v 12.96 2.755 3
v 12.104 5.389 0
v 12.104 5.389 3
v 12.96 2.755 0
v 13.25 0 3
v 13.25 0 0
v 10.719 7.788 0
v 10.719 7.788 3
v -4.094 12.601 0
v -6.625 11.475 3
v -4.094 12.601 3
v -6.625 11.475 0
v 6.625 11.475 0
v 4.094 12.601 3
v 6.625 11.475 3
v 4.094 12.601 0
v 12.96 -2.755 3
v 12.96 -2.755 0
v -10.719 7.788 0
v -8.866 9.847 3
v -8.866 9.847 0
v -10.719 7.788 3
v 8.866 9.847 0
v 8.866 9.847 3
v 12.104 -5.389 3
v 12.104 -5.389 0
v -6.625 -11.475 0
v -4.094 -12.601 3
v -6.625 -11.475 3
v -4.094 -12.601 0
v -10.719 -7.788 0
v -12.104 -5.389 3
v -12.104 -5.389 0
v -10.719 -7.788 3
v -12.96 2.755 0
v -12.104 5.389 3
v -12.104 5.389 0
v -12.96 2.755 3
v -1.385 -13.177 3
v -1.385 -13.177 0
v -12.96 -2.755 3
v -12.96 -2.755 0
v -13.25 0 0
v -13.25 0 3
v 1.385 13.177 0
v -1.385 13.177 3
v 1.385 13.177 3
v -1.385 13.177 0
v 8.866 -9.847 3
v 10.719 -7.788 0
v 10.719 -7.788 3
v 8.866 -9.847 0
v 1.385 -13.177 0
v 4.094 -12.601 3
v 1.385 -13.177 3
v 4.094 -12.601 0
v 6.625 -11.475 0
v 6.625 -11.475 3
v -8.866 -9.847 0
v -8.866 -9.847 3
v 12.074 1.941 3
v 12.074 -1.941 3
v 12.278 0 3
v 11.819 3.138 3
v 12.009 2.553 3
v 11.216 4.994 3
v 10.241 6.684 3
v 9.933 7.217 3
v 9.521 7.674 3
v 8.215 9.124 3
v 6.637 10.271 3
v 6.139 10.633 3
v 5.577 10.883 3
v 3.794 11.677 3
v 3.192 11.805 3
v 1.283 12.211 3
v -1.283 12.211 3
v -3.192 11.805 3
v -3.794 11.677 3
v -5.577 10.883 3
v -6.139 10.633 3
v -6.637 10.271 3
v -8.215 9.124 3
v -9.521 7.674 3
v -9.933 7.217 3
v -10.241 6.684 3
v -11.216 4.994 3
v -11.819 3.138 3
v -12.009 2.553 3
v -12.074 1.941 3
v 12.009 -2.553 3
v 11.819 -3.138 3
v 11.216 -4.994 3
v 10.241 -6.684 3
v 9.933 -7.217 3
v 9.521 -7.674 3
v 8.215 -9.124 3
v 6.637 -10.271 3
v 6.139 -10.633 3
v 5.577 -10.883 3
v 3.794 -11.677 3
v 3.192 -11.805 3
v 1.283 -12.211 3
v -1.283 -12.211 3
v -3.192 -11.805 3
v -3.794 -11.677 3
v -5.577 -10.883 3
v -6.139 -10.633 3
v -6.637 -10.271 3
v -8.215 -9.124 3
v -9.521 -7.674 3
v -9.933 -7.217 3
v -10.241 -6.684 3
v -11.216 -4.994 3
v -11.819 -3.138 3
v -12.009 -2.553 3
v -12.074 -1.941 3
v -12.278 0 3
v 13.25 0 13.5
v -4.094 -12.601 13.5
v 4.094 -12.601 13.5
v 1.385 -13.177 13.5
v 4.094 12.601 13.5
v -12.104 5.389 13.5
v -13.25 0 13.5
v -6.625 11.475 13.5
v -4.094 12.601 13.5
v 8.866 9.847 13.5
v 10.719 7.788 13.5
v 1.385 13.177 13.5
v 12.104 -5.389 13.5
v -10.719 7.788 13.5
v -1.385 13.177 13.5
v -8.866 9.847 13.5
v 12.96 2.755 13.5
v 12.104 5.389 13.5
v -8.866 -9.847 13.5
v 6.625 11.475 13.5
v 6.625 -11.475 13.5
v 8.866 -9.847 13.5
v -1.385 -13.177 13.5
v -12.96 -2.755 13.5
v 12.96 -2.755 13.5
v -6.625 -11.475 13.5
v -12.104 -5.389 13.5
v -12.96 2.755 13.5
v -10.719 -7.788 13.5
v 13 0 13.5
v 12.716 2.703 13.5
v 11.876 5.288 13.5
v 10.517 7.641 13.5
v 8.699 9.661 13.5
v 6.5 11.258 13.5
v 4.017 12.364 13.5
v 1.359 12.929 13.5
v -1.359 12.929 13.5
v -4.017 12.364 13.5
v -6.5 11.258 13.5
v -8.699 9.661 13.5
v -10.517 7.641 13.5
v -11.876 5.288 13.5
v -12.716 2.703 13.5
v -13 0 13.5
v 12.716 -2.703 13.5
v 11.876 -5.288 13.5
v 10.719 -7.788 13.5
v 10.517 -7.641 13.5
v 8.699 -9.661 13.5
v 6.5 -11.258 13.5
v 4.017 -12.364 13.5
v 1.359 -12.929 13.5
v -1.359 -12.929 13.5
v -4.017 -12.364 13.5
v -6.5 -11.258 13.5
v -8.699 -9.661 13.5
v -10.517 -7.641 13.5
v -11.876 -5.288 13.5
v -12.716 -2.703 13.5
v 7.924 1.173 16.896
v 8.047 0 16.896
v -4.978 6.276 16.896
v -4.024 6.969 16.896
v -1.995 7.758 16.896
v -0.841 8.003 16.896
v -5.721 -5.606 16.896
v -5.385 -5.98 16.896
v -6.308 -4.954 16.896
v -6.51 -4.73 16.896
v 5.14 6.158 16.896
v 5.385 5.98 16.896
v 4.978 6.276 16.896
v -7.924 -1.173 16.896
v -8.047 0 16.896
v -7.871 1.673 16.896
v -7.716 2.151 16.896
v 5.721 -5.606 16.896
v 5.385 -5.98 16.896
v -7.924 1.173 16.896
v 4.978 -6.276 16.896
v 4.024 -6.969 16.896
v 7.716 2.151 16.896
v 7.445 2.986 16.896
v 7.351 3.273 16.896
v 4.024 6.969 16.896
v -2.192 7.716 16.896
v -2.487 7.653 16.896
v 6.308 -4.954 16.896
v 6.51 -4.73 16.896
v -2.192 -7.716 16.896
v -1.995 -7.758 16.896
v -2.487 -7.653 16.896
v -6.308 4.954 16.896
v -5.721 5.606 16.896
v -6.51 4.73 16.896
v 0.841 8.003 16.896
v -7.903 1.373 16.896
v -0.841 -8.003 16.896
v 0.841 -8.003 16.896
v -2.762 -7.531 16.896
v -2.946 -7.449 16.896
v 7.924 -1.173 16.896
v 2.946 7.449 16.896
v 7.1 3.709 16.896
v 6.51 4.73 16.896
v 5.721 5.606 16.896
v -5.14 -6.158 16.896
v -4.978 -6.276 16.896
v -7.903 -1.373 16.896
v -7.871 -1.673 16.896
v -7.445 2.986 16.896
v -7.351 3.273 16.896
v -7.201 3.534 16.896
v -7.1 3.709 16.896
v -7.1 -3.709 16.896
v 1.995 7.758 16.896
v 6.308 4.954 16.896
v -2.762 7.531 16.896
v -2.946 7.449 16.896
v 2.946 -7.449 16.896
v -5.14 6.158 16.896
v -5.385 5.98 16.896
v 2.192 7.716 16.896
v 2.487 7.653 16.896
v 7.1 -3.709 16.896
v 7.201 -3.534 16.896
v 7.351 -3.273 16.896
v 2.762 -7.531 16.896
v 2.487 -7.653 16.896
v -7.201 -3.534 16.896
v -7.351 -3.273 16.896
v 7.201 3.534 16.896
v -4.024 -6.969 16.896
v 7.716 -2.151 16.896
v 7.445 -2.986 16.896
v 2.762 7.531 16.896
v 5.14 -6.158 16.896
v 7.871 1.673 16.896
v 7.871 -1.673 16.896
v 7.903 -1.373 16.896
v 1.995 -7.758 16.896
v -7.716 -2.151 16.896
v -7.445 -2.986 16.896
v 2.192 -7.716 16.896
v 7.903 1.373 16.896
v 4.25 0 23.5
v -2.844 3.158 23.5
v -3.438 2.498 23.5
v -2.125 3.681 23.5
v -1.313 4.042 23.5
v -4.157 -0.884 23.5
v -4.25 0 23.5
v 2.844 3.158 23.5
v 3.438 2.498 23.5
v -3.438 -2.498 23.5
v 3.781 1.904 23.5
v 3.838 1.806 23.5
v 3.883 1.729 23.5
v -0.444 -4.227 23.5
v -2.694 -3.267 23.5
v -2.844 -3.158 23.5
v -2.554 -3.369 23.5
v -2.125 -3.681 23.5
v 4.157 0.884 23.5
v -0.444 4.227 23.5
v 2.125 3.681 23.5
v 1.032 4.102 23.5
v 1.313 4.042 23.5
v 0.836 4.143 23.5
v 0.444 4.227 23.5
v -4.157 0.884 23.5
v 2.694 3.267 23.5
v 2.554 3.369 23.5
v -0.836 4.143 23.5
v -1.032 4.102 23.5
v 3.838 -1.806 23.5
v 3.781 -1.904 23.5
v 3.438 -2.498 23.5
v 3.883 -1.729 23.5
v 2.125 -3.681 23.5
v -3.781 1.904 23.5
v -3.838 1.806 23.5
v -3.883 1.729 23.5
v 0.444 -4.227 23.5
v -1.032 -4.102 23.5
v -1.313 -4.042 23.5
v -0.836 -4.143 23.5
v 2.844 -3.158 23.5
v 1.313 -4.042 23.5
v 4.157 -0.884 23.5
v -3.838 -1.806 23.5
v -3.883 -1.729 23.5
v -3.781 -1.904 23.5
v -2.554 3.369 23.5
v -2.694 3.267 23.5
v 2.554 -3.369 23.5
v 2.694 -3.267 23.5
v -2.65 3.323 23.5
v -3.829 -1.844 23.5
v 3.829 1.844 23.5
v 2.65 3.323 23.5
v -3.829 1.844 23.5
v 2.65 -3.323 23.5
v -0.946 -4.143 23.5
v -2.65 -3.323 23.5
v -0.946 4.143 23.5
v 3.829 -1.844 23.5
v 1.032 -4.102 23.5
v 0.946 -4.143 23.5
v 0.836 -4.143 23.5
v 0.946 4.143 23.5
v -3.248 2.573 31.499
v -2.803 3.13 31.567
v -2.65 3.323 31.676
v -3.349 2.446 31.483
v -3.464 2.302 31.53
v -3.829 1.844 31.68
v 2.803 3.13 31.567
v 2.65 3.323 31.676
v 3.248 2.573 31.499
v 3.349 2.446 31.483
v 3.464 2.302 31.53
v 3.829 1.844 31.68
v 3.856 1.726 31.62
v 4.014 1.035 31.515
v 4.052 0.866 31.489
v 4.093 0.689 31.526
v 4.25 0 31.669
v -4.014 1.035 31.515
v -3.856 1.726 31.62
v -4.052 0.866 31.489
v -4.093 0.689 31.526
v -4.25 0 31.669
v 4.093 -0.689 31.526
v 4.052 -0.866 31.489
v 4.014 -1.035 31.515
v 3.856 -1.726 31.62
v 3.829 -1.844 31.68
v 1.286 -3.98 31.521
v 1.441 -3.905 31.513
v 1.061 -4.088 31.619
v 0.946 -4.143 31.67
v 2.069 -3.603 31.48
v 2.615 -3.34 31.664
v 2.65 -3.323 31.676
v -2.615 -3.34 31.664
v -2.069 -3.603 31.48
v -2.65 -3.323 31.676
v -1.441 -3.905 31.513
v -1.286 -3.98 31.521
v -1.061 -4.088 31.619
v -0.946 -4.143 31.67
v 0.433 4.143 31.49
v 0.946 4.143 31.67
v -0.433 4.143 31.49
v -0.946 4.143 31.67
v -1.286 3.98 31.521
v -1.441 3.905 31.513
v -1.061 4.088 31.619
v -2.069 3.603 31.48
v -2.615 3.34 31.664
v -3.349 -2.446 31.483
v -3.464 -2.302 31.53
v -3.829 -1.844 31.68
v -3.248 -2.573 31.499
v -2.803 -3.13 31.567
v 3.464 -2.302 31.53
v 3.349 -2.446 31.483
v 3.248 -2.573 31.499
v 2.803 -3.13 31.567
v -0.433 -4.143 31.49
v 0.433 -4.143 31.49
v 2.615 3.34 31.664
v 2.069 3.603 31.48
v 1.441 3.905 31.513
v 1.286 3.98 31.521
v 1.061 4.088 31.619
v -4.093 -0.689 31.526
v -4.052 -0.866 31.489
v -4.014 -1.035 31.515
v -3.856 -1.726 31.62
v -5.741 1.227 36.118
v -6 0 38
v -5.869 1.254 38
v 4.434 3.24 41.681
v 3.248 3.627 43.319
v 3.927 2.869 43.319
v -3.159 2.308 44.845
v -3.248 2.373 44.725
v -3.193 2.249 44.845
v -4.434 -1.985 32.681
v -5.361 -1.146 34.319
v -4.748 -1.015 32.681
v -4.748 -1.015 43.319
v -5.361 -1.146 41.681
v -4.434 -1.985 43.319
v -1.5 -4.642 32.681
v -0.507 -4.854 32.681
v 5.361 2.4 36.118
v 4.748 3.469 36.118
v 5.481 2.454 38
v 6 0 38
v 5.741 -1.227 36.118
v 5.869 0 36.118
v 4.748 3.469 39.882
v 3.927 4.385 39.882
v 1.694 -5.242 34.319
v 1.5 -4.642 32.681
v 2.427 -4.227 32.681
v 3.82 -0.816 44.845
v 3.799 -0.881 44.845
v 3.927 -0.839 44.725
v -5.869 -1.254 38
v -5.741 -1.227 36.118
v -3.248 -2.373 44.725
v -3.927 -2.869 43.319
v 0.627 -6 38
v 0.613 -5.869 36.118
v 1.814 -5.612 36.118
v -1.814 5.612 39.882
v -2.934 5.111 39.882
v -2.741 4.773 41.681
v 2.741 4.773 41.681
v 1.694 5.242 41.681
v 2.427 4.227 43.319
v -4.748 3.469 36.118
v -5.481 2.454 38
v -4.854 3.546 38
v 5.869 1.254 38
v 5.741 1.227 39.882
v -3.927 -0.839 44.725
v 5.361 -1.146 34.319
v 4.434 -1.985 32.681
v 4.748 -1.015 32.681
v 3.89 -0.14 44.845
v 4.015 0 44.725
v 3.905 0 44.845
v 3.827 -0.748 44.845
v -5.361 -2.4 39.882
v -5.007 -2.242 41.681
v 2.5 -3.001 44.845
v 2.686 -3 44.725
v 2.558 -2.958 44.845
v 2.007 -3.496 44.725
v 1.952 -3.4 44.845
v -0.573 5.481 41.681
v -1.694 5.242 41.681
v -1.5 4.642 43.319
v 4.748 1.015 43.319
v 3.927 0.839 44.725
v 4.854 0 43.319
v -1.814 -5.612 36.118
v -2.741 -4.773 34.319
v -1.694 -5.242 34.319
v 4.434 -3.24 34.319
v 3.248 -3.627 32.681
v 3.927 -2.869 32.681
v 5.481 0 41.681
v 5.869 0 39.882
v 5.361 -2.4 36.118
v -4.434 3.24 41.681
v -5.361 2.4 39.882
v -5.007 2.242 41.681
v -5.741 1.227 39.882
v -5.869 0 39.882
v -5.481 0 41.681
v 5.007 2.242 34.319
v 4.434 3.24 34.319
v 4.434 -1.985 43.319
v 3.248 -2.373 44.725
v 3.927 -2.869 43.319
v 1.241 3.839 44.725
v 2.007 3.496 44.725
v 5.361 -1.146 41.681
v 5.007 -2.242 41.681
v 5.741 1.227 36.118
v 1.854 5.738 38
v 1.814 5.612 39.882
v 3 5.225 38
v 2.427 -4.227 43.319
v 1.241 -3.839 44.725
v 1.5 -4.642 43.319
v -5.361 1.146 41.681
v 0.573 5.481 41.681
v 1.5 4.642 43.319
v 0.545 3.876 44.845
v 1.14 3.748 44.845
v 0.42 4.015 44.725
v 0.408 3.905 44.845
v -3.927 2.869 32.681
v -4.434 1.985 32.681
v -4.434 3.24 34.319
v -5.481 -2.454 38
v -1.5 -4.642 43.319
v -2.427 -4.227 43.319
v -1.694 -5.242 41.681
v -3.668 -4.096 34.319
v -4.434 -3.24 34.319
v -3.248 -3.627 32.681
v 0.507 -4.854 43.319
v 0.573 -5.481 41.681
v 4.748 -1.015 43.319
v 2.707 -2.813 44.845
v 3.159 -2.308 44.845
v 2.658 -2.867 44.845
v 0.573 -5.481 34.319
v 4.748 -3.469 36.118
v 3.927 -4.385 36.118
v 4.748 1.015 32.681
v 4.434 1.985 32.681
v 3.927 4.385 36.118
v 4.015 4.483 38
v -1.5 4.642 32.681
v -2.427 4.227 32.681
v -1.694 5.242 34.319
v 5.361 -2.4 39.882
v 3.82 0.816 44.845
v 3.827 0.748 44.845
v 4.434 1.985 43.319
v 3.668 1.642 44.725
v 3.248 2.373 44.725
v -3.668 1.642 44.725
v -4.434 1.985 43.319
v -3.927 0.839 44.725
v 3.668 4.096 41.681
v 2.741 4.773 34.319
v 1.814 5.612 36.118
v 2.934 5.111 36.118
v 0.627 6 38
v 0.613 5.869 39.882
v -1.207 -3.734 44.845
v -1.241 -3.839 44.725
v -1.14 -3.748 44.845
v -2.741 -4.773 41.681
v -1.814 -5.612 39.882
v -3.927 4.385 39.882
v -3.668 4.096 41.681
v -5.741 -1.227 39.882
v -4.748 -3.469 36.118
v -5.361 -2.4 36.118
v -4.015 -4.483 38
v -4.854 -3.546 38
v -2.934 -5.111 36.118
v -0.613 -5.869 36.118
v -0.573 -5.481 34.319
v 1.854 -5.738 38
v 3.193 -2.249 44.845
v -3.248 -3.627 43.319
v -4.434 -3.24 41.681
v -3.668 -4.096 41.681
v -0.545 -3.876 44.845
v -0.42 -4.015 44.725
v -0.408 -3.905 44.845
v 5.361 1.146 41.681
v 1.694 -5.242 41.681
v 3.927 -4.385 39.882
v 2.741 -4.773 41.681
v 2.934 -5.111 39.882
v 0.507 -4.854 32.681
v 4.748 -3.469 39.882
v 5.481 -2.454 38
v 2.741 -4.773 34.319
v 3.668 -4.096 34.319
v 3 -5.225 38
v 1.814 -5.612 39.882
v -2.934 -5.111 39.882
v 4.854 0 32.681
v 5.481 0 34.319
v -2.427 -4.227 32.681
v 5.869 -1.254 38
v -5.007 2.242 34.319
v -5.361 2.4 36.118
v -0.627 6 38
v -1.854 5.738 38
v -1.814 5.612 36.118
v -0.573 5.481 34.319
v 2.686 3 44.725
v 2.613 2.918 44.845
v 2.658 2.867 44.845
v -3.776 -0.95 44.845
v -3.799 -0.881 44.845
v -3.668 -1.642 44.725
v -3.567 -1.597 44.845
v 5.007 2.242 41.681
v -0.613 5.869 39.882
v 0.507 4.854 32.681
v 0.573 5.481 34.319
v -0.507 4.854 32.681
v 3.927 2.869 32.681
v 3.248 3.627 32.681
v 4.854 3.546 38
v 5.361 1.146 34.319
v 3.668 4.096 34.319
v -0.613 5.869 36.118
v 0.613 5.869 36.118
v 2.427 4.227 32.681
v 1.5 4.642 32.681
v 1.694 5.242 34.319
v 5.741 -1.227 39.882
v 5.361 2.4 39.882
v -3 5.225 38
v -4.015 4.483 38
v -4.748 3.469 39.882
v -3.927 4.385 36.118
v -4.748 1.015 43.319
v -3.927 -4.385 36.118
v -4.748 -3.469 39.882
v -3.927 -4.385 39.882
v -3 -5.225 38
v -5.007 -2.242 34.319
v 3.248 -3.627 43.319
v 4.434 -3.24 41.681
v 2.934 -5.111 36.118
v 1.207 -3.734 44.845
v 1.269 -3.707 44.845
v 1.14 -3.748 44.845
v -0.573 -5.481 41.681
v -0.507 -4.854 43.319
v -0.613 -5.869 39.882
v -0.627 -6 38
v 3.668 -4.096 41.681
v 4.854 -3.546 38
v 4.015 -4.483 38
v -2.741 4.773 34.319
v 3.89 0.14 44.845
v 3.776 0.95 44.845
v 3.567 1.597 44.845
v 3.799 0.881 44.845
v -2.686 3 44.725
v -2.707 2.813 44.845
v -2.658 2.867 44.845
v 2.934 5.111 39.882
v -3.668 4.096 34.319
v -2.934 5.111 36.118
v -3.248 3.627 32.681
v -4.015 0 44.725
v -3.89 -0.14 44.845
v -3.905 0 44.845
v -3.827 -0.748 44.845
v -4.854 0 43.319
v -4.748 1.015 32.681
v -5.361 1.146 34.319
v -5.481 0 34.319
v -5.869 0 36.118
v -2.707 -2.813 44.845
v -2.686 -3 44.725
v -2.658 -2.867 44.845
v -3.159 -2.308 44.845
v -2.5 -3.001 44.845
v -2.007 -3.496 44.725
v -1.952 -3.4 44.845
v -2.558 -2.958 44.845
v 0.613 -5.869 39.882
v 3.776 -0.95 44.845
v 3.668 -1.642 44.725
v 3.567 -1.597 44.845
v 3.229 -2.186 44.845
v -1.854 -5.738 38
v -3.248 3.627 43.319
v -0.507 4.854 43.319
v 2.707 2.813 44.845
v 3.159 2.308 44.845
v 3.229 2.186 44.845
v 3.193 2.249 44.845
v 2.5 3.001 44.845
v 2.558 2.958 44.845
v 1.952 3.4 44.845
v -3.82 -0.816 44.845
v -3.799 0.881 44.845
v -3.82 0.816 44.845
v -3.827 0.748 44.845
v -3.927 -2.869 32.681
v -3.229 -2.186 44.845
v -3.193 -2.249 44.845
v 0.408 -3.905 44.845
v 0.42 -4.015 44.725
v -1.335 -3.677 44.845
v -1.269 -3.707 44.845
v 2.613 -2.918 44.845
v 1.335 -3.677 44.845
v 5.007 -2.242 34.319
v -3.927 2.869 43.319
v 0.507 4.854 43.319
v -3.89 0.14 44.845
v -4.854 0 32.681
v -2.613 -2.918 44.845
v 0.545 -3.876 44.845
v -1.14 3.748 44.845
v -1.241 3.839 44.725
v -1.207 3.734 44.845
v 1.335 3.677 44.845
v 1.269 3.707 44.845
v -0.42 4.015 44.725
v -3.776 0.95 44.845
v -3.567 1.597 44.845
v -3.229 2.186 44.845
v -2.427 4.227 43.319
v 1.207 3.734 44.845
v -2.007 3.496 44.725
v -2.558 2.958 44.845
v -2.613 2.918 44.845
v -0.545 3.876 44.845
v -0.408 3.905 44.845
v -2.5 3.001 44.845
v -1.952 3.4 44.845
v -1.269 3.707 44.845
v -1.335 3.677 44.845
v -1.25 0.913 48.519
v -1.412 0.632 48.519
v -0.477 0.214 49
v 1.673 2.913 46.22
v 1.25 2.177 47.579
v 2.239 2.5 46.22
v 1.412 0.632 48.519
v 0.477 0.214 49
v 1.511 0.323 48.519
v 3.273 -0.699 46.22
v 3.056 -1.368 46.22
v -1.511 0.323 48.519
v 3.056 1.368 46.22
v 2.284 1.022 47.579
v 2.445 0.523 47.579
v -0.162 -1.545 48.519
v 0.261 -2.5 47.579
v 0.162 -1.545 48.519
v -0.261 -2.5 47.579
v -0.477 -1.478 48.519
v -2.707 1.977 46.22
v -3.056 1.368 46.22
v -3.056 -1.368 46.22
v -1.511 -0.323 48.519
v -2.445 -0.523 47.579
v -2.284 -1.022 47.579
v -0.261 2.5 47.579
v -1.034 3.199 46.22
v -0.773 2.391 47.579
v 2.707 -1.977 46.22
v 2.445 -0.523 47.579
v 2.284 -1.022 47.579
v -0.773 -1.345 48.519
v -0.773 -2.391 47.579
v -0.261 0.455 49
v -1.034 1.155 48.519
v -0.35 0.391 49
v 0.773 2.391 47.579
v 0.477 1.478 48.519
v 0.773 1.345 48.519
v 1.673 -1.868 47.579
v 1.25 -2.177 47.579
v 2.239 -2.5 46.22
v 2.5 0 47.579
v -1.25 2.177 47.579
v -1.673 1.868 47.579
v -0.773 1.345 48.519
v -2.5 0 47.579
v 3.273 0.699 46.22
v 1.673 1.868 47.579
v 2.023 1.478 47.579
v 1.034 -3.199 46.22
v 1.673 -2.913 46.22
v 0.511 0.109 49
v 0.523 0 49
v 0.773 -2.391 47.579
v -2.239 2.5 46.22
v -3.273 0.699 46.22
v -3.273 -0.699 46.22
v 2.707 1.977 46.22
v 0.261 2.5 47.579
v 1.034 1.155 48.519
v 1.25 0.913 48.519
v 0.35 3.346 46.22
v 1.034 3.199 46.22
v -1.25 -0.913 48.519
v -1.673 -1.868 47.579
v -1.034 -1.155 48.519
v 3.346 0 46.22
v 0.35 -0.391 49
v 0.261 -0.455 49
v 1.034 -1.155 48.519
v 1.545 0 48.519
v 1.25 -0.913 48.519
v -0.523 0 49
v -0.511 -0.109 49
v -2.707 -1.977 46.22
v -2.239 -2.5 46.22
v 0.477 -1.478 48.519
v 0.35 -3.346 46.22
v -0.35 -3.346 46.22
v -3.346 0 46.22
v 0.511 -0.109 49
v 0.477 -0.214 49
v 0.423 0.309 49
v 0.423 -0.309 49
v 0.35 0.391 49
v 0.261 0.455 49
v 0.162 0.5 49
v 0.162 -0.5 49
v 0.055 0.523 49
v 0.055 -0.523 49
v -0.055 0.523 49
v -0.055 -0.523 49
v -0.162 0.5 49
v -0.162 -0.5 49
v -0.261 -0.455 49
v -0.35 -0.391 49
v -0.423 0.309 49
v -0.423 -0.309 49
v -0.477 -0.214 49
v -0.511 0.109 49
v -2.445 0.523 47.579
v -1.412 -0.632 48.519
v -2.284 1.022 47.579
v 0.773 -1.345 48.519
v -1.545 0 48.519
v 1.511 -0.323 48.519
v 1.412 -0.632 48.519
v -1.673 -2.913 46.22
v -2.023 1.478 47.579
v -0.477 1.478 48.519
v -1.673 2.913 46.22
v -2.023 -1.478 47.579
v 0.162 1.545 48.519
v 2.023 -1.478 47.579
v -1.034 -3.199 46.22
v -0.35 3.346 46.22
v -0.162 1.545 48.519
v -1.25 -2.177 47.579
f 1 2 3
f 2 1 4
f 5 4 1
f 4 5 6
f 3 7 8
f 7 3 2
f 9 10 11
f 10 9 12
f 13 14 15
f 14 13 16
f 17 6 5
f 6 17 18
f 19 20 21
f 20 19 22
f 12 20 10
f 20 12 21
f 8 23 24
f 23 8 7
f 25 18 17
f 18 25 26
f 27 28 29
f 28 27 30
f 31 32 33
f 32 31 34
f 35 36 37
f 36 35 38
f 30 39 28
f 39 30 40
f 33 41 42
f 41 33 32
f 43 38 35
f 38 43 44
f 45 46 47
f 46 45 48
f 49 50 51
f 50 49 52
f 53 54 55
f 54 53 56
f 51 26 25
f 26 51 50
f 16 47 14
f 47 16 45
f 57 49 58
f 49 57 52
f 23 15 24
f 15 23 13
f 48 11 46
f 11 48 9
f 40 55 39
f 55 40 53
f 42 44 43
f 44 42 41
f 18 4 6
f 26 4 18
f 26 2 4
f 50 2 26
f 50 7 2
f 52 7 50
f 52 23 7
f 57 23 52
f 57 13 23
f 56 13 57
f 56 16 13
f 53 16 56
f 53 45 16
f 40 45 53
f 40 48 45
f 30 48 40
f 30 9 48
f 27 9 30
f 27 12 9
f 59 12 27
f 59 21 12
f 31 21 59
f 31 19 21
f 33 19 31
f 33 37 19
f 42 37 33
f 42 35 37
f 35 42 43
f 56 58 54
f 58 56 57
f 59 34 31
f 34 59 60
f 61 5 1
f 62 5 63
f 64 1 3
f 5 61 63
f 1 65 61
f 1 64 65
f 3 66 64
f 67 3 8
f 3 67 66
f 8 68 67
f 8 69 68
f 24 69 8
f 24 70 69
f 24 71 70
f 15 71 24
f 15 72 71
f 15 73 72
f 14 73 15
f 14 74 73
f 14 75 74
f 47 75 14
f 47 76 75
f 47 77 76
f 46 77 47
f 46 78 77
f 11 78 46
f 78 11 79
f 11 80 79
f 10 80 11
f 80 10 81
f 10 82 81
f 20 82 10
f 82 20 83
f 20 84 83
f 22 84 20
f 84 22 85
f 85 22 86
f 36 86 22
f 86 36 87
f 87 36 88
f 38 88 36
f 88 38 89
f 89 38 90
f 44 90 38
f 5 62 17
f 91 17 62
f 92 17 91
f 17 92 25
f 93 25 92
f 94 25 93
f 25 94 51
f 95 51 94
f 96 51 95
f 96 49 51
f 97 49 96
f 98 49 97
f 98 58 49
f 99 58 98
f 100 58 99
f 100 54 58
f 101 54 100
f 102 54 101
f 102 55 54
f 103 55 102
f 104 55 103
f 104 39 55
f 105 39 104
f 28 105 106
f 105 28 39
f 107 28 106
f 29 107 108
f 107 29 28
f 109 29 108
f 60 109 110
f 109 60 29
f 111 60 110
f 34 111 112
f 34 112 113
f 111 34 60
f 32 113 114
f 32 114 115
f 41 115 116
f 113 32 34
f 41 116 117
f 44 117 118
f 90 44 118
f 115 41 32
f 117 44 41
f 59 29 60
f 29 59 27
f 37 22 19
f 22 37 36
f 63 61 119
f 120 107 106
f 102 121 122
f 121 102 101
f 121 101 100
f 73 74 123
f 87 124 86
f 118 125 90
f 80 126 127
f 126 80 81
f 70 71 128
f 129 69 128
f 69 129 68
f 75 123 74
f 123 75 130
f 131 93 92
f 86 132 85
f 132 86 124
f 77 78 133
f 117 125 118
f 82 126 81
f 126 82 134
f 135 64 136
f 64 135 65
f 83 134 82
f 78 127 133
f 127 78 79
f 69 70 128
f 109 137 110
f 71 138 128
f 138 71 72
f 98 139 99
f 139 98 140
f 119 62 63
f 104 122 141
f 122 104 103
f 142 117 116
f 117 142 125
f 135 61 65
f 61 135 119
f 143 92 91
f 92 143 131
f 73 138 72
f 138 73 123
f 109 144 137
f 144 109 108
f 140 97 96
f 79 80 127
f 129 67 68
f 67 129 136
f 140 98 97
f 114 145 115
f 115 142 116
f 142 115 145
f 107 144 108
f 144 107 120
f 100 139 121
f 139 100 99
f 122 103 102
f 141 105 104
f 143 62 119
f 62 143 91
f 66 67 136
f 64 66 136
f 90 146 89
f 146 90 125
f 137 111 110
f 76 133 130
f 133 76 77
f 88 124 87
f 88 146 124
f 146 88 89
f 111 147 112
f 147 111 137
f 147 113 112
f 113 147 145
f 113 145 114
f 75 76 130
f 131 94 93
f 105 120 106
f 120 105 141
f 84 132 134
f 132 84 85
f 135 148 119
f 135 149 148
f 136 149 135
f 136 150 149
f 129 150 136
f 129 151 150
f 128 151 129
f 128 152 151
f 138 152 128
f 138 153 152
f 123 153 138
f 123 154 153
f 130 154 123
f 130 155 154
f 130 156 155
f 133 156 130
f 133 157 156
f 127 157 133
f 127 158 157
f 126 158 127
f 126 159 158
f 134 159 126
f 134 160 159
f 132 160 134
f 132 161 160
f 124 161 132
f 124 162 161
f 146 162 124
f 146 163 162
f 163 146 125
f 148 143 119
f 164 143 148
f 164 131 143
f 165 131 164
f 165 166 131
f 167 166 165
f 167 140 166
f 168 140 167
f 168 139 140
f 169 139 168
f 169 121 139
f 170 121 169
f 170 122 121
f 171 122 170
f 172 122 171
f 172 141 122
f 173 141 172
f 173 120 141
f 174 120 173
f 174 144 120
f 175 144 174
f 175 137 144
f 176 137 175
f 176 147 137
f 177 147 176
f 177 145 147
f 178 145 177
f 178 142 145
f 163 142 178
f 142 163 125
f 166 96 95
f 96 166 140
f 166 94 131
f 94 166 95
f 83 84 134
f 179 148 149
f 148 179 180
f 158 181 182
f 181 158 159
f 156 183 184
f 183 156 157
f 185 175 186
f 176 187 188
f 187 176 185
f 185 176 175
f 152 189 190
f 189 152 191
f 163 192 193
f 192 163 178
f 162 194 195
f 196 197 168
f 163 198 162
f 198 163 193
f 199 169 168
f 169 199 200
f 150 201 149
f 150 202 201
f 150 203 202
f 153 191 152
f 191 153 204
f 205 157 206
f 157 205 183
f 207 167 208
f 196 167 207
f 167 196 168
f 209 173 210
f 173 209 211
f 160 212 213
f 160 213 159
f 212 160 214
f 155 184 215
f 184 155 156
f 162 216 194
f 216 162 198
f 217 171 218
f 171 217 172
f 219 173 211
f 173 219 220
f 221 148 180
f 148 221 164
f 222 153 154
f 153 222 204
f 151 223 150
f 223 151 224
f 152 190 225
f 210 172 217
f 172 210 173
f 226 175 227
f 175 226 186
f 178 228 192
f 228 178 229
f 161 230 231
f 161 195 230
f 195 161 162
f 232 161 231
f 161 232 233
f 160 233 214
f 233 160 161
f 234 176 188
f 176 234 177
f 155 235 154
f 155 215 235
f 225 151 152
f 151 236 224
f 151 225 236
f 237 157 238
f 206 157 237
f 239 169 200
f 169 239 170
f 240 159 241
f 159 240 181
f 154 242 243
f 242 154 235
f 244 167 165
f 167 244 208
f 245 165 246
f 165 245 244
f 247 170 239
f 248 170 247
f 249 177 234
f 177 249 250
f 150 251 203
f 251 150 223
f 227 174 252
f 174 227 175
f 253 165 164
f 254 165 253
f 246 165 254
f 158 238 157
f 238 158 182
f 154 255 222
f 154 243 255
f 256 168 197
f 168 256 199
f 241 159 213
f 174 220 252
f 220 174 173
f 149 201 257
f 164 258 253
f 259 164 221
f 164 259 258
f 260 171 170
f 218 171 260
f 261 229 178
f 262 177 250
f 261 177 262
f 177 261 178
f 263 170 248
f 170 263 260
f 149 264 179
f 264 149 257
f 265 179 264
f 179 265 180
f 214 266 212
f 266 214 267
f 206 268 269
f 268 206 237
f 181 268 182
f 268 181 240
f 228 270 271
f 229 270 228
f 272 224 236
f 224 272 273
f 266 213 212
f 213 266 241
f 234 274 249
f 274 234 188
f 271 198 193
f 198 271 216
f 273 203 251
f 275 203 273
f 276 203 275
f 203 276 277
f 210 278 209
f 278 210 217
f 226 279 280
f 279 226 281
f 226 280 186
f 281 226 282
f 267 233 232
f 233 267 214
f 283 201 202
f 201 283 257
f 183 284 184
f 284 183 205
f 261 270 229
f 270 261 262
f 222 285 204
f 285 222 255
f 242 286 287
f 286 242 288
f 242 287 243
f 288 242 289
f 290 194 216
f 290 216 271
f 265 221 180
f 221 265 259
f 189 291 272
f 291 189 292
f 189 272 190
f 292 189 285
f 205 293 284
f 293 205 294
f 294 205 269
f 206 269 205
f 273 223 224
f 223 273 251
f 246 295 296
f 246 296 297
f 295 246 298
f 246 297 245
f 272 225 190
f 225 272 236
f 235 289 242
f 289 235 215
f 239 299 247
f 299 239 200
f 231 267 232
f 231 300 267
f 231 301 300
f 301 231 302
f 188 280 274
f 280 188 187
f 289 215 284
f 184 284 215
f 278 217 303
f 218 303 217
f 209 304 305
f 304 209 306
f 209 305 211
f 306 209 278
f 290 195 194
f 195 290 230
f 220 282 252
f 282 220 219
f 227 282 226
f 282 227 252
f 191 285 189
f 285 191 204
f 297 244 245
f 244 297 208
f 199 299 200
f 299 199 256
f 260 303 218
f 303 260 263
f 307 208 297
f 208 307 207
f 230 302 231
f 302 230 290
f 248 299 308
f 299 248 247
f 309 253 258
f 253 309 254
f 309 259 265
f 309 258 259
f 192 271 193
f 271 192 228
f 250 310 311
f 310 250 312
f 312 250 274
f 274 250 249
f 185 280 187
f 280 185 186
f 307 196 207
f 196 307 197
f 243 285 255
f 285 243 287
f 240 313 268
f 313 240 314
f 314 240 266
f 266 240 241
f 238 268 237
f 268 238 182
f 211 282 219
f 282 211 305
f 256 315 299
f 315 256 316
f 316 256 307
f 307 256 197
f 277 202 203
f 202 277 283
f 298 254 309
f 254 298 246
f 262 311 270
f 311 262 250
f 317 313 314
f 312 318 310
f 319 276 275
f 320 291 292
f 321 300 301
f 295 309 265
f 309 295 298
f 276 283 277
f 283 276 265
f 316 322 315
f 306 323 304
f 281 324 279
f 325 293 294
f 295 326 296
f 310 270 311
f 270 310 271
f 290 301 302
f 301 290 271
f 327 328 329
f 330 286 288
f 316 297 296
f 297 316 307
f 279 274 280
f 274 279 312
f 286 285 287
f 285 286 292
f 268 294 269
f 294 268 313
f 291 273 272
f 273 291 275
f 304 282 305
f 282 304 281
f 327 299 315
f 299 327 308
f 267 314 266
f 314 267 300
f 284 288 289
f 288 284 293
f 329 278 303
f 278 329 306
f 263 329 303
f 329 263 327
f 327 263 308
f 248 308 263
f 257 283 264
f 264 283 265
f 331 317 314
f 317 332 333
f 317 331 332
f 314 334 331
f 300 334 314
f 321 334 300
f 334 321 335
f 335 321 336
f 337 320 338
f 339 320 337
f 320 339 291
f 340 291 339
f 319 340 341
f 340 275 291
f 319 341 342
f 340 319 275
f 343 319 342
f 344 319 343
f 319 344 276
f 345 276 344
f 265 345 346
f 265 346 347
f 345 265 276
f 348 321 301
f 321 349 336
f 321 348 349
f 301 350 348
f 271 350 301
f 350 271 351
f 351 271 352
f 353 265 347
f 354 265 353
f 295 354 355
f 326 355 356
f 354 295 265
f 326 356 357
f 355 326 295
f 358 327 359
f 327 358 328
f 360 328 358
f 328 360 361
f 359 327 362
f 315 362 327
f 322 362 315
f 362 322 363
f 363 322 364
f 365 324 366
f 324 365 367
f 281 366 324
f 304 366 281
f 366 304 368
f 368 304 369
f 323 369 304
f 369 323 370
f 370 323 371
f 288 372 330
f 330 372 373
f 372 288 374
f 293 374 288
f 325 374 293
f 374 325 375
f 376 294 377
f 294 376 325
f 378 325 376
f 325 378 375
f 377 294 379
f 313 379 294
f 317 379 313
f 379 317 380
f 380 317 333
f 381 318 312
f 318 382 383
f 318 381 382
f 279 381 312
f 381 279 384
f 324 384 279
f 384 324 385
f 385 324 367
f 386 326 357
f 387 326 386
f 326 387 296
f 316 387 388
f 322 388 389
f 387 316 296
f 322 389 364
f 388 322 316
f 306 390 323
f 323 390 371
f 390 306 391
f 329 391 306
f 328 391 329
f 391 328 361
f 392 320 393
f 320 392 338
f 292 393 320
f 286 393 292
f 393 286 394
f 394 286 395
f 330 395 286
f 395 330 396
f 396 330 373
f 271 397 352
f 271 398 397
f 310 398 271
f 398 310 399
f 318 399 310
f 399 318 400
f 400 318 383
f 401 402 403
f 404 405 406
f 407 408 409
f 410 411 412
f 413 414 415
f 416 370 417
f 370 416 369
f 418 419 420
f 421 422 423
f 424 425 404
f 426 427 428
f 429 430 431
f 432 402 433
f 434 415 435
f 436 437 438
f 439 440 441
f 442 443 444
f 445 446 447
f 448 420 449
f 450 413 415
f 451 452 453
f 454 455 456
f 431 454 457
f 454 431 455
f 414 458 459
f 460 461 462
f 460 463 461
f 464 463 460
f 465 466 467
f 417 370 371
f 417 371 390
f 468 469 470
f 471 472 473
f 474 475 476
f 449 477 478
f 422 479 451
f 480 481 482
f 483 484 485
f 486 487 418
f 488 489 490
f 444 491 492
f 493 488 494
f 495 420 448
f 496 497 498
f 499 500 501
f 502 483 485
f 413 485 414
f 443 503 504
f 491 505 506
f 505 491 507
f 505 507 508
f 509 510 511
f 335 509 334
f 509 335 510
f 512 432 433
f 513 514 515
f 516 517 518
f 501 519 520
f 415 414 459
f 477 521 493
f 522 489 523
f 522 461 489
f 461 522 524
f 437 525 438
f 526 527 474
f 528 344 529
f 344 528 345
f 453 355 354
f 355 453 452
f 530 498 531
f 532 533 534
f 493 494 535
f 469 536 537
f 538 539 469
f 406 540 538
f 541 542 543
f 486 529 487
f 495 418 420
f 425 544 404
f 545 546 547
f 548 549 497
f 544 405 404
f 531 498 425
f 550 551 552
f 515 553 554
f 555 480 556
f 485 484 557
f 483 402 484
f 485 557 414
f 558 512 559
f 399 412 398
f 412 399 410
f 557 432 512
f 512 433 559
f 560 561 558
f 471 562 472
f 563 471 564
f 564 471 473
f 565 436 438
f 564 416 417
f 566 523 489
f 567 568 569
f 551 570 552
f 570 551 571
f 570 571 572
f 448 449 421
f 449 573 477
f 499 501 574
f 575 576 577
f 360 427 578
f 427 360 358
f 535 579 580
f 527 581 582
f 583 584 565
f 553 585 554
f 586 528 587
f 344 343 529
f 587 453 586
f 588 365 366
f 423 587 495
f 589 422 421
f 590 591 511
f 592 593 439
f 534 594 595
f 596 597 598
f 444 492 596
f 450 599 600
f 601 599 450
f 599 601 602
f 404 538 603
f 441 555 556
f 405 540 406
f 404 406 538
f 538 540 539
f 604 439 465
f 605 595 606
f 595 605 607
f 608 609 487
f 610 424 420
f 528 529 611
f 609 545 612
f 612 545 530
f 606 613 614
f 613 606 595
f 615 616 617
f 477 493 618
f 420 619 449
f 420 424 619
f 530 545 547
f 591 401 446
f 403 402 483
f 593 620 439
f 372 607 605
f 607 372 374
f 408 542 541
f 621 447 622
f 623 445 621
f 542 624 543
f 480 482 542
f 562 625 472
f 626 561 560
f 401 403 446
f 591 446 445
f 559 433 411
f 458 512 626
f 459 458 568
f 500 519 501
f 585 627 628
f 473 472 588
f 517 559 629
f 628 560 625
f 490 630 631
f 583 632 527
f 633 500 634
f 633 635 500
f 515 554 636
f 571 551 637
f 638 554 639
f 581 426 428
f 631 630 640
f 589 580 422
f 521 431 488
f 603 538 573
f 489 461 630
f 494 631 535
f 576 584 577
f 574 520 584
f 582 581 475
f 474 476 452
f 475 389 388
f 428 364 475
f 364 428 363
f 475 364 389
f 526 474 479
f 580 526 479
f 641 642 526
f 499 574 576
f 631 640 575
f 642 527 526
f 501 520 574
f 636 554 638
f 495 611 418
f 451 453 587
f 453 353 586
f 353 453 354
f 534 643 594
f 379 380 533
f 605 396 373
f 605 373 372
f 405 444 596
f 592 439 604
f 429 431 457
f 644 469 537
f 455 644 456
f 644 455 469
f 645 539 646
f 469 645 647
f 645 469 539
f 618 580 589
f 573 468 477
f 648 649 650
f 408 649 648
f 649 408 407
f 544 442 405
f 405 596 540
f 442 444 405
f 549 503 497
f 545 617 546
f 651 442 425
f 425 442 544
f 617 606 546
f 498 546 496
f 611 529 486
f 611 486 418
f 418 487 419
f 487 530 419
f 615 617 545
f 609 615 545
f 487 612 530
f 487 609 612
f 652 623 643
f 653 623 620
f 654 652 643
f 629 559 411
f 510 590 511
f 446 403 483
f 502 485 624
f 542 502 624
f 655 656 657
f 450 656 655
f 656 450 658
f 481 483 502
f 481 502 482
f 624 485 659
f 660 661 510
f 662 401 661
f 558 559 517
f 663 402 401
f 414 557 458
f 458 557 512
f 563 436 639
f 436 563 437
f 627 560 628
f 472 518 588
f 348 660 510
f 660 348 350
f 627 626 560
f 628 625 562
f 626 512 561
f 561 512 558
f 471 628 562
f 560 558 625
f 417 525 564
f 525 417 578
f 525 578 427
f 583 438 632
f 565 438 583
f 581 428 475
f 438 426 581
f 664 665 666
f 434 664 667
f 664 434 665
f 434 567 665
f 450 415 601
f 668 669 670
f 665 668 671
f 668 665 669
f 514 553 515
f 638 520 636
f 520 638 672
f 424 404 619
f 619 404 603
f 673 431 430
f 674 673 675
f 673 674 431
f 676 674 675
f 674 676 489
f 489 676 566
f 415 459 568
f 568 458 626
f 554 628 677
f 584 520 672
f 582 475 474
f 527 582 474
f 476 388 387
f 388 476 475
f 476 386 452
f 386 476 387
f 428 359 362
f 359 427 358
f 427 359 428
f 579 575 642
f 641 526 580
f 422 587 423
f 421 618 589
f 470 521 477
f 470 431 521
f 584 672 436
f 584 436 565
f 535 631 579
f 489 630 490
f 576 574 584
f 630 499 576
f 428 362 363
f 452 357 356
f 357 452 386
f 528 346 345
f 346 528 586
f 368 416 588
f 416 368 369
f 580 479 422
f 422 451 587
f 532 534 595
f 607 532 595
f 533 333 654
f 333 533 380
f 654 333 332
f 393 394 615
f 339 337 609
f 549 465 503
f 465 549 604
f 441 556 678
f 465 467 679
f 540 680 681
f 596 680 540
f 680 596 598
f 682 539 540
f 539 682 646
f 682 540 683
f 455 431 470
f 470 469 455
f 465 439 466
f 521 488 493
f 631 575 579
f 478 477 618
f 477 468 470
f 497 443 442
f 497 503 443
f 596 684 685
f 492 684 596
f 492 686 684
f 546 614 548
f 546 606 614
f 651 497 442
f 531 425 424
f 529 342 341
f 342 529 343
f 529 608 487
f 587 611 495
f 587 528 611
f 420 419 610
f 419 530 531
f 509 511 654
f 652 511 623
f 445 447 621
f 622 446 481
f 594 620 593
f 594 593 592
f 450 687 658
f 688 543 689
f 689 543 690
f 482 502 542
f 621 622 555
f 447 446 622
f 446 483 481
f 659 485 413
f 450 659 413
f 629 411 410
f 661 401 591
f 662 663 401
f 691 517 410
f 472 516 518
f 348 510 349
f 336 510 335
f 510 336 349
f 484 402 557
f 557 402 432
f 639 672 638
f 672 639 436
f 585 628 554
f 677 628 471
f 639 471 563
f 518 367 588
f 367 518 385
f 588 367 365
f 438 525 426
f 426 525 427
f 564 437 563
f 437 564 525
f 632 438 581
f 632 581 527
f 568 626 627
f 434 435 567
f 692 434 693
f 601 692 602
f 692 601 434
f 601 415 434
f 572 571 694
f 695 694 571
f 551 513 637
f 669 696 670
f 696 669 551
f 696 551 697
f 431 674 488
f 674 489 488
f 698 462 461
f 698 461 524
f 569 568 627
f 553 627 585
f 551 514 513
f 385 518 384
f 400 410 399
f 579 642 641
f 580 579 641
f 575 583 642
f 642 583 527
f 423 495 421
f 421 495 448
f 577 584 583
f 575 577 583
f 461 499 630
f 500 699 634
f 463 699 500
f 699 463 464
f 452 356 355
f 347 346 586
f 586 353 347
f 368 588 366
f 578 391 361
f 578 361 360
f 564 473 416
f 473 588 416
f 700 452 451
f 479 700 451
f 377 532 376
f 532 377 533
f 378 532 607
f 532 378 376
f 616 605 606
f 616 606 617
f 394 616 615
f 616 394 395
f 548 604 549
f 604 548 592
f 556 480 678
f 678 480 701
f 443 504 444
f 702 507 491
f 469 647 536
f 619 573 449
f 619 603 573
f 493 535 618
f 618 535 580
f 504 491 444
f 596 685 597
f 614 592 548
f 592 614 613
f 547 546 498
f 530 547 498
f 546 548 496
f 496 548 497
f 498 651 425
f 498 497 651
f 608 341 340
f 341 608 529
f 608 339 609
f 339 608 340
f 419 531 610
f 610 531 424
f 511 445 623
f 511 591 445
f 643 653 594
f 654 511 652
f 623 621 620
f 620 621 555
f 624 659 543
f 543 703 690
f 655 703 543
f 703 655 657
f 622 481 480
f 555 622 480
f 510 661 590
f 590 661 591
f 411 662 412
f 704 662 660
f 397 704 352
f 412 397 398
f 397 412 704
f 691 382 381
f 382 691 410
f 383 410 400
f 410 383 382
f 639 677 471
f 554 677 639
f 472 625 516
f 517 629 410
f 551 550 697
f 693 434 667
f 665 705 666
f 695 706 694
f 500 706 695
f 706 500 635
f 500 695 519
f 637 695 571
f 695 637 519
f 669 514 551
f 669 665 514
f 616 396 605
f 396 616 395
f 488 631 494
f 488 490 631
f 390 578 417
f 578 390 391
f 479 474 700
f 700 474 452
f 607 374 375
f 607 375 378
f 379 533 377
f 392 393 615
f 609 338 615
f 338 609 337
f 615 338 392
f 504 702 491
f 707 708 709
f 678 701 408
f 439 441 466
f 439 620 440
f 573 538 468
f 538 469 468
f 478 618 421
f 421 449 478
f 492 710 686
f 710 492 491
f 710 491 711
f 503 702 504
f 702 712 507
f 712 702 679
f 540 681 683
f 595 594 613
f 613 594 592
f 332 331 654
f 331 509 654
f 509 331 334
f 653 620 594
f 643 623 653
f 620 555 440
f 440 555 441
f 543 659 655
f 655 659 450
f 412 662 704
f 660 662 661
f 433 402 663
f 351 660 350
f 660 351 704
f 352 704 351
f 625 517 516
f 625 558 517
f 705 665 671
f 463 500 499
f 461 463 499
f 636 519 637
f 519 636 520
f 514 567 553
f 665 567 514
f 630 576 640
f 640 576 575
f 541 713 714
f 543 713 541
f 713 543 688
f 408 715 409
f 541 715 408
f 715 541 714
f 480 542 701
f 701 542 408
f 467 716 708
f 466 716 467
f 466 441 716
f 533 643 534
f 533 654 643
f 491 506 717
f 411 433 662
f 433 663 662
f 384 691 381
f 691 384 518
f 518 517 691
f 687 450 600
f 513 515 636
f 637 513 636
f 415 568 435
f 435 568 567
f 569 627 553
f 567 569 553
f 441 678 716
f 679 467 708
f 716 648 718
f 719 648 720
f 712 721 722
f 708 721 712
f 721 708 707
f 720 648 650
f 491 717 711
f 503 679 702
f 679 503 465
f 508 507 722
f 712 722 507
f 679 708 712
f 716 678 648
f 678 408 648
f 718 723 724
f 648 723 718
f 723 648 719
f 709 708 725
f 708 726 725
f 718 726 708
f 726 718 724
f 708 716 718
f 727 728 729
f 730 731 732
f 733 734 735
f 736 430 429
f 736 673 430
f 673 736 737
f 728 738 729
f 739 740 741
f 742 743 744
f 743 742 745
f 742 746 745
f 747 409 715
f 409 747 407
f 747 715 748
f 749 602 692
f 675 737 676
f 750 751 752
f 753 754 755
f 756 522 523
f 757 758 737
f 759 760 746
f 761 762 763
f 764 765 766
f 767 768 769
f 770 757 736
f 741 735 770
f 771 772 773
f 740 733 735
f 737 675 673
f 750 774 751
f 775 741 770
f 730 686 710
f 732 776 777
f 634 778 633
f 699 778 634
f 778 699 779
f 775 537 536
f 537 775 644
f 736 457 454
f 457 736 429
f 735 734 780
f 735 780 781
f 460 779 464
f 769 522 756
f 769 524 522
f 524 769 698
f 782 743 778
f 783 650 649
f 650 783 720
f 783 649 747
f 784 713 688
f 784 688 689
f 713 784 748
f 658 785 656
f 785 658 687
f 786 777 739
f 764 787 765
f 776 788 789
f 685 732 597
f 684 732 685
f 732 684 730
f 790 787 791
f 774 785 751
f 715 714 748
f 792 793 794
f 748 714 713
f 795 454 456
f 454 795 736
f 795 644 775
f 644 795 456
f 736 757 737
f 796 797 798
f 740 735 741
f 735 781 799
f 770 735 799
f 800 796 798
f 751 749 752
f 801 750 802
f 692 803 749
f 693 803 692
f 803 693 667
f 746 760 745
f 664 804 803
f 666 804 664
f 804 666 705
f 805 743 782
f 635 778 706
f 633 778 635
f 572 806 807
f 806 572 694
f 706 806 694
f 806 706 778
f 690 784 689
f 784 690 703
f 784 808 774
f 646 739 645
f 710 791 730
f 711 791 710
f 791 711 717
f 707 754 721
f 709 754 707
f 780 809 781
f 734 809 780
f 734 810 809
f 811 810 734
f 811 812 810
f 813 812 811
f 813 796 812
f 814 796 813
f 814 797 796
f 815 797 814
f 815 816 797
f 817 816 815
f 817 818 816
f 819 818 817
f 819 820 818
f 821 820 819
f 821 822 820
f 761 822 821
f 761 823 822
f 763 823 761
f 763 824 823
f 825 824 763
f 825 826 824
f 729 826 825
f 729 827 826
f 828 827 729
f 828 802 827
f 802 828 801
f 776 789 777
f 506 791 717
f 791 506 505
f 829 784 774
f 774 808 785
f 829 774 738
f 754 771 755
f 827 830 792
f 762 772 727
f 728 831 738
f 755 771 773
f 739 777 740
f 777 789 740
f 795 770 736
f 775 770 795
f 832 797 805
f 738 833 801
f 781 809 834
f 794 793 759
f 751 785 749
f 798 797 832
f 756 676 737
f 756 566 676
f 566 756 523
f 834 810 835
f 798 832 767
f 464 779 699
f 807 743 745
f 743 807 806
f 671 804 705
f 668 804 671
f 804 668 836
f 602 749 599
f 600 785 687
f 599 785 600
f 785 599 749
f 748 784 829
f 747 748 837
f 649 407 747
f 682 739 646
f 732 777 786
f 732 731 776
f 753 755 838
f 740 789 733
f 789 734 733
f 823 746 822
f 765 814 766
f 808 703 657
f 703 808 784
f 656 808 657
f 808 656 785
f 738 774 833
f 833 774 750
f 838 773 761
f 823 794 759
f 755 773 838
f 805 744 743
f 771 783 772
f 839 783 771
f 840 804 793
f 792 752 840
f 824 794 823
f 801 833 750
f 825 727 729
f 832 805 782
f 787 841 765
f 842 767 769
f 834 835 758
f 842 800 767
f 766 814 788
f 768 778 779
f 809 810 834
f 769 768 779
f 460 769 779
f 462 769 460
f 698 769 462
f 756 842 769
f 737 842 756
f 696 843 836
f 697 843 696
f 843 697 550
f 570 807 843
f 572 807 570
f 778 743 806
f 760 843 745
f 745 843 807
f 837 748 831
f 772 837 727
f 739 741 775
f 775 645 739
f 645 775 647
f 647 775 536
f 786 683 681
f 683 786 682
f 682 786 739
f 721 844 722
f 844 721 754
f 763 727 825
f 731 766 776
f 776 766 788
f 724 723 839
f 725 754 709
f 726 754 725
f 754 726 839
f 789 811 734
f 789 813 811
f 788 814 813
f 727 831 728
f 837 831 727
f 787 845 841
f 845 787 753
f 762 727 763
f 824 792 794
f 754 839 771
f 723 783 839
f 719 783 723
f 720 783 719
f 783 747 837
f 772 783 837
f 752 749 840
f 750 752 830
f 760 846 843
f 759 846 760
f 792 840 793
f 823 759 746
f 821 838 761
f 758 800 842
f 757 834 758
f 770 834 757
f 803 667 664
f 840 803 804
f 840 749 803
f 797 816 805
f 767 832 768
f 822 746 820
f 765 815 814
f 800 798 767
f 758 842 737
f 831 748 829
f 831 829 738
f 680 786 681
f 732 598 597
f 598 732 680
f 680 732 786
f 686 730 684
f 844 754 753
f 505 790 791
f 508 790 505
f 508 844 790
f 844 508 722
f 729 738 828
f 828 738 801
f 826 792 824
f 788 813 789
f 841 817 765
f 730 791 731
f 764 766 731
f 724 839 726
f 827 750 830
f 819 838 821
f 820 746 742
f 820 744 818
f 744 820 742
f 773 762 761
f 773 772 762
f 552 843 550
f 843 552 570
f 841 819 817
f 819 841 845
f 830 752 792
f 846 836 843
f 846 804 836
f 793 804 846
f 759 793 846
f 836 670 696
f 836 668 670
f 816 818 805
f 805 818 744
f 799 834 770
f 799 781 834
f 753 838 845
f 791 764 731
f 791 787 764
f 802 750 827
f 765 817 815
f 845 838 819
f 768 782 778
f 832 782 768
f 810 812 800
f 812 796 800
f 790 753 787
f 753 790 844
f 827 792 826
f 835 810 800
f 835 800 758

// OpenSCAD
// base
cylinder(d=26.5, h=3);
cylinder(d1=24, d2=26.5, h=13.5);

// tapered neck on base
translate([0,0,13.5]) cylinder(d1=26, d2= 8.5, h=6);
translate([0,0,13.5]) cylinder(d1=20, d2= 8.5, h=10);
//translate([0,0,13.5]) cylinder(d1=14, d2= 8.5, h=16);

//main body
translate([0,0, 23.5]) cylinder(d=8.5, h=13);

// resize the sphere to extend 30 in x, 60 in y, and 10 in the z directions.
translate([0,0, 38])  resize(newsize=[12,12,18]) sphere(r=20);
translate([0,0, 38])  resize(newsize=[10,10,22]) sphere(r=20);  
